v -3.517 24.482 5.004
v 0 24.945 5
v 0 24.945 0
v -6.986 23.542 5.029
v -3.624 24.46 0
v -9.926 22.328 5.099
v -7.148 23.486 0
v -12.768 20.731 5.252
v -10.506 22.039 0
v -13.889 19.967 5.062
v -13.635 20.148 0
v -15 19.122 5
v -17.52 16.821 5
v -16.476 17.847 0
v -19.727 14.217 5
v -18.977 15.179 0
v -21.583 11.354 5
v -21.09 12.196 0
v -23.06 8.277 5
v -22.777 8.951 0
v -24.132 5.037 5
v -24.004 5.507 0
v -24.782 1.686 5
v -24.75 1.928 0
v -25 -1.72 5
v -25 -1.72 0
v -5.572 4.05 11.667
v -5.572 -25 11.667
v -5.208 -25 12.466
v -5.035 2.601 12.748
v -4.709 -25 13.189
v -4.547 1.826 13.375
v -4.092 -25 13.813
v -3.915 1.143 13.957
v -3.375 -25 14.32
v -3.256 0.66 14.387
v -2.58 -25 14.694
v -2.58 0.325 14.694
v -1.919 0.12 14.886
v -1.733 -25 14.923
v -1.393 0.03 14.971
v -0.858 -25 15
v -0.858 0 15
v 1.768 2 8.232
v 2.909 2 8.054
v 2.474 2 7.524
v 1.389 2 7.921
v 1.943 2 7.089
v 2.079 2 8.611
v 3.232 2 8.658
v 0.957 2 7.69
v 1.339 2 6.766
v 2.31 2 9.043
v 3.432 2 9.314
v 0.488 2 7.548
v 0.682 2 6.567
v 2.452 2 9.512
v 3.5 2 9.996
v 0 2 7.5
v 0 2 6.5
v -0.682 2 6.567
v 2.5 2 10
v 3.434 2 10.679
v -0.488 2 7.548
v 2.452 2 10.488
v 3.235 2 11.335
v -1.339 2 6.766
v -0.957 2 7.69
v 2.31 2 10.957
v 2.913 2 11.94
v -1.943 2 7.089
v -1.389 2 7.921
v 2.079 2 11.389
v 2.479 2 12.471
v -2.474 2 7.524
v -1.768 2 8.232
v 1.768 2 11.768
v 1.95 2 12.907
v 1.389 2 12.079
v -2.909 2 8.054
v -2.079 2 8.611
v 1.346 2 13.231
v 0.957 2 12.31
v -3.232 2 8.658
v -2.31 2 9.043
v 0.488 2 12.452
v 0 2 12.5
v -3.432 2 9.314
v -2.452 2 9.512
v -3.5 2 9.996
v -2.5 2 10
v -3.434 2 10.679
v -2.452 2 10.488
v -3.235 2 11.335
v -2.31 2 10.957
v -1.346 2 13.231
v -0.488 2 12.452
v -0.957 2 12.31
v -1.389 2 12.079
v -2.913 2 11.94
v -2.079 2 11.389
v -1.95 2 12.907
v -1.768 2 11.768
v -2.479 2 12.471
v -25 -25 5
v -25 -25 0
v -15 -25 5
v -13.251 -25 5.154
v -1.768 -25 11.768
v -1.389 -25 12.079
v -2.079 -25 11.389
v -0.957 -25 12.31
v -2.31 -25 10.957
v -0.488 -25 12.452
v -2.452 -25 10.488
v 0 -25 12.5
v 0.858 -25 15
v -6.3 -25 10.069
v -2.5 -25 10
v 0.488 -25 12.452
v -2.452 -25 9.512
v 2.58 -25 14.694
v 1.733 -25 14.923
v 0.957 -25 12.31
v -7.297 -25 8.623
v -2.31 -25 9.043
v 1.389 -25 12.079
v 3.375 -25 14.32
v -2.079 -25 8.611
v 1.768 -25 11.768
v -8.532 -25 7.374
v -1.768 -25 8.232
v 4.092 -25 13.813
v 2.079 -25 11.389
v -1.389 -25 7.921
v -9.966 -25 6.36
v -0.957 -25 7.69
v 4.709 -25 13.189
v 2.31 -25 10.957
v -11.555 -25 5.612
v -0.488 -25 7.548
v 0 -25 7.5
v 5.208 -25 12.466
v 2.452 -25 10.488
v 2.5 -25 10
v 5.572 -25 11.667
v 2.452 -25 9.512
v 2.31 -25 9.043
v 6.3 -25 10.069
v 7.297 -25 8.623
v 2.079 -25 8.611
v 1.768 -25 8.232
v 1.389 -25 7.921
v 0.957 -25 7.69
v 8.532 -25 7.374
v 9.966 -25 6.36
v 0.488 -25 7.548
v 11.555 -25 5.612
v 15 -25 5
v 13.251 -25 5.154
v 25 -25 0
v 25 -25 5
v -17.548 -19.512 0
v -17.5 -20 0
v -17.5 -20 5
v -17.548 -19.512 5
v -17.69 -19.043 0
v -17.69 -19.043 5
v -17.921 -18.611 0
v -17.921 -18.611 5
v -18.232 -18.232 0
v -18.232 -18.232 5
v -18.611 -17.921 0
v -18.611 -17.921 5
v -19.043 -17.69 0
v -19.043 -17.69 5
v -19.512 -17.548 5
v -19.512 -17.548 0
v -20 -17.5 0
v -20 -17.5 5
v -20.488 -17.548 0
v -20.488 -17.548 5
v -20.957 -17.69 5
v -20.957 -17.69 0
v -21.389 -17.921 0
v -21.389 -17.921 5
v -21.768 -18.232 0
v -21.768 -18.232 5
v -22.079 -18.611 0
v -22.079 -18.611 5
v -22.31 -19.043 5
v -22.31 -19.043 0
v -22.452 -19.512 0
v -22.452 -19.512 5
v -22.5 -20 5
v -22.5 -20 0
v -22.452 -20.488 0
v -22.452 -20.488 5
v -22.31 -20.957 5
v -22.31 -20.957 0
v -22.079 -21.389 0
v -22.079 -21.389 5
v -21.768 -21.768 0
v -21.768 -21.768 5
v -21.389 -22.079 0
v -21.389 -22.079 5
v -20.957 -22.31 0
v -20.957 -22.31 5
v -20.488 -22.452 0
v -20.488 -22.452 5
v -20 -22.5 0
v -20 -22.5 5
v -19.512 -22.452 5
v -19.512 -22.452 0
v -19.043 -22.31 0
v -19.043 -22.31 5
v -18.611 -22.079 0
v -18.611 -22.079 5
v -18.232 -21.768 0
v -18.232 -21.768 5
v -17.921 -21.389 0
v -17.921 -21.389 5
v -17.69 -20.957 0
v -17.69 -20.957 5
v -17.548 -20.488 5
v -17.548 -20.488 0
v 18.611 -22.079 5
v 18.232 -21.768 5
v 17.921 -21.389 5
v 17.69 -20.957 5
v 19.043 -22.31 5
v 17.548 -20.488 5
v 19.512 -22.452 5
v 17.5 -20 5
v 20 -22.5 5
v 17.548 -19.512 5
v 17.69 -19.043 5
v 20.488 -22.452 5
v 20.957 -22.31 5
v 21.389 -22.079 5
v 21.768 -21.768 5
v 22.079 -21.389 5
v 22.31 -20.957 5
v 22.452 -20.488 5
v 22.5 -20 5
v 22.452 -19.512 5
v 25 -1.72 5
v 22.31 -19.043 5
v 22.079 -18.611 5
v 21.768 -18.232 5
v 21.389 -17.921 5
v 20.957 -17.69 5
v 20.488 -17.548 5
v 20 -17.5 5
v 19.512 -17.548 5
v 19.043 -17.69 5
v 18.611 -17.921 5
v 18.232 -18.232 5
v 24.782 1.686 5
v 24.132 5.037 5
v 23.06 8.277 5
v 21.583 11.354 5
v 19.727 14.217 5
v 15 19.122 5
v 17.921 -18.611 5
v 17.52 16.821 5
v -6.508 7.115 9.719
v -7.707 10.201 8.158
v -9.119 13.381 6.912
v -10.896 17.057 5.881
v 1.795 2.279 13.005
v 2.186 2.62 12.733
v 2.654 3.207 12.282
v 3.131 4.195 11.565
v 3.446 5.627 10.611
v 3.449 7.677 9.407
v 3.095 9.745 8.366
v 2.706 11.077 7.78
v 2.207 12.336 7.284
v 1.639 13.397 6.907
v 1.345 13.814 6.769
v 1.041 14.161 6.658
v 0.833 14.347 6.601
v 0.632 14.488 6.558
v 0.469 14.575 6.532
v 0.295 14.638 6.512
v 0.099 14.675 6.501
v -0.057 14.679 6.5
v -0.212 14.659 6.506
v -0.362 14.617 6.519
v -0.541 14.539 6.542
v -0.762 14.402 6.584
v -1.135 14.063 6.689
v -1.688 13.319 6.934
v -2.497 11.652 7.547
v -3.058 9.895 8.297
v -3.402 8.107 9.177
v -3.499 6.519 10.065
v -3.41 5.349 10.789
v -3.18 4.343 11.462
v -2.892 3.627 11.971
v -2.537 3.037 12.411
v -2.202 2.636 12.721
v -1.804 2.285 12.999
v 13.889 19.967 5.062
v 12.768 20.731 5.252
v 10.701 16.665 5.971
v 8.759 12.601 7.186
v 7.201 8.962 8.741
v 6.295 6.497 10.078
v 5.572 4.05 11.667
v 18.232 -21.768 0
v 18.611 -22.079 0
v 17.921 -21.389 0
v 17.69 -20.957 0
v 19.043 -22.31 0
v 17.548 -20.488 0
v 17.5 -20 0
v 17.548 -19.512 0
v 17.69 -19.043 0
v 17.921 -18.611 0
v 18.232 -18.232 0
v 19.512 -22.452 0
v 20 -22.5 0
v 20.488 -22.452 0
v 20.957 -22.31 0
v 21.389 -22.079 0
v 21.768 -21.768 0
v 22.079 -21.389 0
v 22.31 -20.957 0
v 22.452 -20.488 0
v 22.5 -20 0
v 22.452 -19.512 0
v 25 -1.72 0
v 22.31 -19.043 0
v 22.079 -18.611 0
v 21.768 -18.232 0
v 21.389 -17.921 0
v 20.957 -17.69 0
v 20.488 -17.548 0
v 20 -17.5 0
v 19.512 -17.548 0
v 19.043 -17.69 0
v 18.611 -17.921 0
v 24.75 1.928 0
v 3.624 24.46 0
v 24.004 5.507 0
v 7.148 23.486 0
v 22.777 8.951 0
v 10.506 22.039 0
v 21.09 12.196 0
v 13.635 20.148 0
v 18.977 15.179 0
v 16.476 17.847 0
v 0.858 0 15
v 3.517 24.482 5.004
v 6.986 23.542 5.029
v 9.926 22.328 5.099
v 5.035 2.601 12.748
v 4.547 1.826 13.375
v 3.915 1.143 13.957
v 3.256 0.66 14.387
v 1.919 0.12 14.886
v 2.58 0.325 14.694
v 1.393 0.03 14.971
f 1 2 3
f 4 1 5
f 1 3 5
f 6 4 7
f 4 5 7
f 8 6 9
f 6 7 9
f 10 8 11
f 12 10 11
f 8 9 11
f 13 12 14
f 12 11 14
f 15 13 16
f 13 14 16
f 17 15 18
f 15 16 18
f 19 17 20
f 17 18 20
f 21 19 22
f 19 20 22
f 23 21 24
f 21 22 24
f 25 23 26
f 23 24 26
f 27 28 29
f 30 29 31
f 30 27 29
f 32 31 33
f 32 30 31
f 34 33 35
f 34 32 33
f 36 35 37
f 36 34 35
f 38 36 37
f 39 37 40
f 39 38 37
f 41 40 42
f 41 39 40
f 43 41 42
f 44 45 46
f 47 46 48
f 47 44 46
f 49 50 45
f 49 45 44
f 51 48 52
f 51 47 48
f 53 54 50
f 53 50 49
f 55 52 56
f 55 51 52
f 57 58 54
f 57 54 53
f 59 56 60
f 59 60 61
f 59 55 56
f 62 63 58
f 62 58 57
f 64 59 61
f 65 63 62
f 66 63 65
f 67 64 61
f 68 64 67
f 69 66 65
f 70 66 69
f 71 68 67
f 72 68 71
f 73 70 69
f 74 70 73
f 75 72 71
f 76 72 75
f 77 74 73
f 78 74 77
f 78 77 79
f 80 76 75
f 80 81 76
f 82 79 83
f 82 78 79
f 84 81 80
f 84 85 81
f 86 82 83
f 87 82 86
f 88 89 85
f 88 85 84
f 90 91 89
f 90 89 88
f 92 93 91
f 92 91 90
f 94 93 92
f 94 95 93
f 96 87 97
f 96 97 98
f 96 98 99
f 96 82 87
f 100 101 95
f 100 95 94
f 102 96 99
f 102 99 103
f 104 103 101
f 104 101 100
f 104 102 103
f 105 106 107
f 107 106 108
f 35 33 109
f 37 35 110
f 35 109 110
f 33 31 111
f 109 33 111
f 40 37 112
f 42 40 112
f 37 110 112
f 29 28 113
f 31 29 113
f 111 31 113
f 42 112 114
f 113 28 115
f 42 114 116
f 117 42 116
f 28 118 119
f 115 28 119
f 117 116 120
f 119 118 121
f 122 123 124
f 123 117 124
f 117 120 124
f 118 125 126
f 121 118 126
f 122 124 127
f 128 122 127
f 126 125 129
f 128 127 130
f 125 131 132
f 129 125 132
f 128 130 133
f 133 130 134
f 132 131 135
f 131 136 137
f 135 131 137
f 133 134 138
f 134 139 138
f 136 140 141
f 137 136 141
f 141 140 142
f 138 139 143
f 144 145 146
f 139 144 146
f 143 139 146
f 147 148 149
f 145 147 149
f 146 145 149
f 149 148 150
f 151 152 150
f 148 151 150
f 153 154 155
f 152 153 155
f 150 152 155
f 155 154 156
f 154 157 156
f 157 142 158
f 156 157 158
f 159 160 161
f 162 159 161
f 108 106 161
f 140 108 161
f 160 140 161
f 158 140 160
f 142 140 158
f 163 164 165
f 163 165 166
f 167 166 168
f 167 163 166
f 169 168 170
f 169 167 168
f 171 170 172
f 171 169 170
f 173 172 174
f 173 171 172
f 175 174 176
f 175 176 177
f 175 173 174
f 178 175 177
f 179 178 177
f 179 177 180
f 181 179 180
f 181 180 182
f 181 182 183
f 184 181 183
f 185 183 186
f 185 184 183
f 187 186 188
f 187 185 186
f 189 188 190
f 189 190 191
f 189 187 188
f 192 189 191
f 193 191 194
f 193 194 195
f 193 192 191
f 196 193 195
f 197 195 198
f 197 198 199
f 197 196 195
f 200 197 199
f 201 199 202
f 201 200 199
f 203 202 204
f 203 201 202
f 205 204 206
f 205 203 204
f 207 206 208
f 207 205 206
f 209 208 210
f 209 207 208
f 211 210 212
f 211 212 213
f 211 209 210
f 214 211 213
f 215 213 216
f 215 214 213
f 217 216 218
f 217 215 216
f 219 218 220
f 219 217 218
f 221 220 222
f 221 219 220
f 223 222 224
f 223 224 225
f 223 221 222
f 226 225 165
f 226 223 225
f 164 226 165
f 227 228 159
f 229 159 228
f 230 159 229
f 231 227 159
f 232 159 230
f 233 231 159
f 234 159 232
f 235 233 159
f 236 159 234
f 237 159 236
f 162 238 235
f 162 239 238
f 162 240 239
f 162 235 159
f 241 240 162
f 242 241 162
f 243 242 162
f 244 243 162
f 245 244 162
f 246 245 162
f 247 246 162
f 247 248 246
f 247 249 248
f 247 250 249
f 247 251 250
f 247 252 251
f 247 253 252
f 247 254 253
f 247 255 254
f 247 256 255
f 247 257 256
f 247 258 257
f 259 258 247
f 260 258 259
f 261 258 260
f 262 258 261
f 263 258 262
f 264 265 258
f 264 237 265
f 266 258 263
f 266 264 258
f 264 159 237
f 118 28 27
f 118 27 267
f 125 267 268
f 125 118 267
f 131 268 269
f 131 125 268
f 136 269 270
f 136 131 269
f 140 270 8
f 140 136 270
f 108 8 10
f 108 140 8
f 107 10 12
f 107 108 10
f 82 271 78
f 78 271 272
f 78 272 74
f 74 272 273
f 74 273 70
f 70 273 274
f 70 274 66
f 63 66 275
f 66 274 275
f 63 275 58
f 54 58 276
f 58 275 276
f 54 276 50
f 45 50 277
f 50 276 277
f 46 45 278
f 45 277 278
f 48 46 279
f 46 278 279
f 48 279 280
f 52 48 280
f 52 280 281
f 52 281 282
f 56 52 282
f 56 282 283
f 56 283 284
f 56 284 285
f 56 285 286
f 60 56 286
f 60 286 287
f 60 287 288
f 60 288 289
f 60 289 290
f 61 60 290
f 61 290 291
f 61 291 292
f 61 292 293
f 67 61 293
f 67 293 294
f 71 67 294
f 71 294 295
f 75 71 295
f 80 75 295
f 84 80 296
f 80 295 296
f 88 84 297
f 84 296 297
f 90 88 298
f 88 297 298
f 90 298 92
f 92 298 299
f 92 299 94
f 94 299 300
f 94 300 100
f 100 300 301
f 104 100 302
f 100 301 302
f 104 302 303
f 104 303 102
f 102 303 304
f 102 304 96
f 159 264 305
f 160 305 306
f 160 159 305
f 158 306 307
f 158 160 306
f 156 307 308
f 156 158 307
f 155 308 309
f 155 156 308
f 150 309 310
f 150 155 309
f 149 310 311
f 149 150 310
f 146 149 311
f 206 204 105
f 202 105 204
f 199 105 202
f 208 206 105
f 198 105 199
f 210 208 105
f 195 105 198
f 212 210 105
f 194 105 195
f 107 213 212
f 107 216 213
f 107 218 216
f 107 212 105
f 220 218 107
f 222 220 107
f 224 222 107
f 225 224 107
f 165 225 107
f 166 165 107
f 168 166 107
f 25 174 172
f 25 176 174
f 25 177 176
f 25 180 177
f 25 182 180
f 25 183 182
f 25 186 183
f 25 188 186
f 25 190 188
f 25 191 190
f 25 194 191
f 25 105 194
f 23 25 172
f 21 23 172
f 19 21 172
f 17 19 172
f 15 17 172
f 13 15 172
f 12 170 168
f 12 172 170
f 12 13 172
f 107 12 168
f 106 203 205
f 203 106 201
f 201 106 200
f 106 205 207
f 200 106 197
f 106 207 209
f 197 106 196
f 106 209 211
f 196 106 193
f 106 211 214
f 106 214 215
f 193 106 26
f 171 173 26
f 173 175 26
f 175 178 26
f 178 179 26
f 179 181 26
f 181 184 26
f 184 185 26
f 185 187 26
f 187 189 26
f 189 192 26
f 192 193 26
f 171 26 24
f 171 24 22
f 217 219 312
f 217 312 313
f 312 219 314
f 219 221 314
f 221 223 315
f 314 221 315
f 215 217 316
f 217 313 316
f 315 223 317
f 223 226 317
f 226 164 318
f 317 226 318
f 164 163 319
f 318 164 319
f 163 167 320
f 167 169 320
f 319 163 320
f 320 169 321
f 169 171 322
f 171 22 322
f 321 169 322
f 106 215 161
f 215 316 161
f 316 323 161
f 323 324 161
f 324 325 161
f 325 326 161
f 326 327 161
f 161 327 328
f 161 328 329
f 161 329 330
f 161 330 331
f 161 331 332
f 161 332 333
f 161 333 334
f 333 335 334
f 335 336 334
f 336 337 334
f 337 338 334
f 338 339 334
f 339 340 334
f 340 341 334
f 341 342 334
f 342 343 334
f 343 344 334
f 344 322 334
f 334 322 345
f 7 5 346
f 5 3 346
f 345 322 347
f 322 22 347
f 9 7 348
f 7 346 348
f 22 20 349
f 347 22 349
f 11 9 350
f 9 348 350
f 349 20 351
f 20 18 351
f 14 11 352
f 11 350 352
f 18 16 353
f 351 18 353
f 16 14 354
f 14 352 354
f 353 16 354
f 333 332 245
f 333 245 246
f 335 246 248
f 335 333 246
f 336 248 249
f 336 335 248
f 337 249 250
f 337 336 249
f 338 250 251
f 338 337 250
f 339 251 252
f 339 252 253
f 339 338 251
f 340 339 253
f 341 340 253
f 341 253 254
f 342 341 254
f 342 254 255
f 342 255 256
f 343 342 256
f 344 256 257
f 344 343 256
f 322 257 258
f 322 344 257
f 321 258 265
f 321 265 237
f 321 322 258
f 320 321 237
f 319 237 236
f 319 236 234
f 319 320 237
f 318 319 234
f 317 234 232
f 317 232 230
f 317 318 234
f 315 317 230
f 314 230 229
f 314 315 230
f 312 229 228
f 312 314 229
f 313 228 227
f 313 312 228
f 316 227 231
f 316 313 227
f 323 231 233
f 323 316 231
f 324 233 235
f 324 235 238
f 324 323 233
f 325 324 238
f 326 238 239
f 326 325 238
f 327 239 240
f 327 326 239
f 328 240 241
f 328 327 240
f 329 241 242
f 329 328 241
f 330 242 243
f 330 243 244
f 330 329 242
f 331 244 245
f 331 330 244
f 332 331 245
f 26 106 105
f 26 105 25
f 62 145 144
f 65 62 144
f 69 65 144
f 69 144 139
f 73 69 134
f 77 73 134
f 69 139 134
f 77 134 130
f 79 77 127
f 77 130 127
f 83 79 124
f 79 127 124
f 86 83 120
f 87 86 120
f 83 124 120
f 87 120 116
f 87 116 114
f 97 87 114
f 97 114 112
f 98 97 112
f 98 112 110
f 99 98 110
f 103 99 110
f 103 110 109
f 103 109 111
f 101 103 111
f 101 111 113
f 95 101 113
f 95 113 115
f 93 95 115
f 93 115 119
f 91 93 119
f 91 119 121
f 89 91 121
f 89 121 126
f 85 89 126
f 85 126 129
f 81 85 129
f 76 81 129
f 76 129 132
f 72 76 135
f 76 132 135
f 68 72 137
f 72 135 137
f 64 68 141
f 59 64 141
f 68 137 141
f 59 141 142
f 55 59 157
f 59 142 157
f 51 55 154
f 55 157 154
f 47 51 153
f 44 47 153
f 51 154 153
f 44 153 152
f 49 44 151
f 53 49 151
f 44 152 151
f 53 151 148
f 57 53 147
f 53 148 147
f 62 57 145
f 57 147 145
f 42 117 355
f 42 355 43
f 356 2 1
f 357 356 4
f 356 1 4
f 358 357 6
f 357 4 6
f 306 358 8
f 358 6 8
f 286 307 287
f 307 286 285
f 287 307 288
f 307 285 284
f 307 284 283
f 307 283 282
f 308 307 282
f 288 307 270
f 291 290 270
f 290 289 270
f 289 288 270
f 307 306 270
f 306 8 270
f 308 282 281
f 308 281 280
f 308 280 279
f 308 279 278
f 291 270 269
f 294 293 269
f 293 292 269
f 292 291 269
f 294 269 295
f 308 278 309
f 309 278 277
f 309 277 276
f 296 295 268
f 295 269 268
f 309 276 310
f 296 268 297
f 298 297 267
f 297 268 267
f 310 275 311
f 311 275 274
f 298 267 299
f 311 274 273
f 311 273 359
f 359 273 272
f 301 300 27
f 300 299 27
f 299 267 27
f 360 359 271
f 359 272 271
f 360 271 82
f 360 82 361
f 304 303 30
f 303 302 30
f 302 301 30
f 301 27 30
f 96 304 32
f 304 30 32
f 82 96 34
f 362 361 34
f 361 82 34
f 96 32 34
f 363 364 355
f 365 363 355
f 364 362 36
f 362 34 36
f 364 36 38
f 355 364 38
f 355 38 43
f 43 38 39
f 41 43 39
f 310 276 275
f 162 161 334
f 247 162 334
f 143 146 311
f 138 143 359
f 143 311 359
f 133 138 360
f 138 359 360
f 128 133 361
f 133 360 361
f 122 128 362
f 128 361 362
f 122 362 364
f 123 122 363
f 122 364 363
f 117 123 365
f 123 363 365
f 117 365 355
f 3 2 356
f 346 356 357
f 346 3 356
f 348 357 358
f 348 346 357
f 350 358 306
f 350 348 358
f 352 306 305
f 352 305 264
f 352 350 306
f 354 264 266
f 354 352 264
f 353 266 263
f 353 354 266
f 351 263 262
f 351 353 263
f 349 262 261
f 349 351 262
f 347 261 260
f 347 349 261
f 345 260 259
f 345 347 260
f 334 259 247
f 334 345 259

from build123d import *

# Parameters (mm, degrees)
F0_W        = 50
F0_H        = 50
F0_R        = 2.5
F1_DEPTH    = 5
F2_R        = 2.5
F3_DEPTH    = 50
F4_R        = 5
F6_DEPTH    = 50
F7_R        = 3.5
F8_DEPTH    = 23
F9_T1_DEPTH = 138.5987158


# Not quite as in the source:
# - a fillet or chamfer that OpenCascade refuses, or shapes differently, is made with other operations: its cross-section is extruded or revolved along the edge and cut away or added


with BuildPart() as f1:
    # F0 (on Top) → F1 (new body)
    with BuildSketch(Plane.XY):
        Rectangle(F0_W, F0_H)
        with Locations((-20, -20)):
            Circle(F0_R, mode=Mode.SUBTRACT)
        with Locations((20, -20)):
            Circle(F0_R, mode=Mode.SUBTRACT)
    extrude(amount=F1_DEPTH)

    # F2 (on face) → F3 (join, through all)
    with BuildSketch(Plane.XZ.offset(25)):
        with BuildLine():
            Line((-5, 5), (5, 5))
            Line((5, 5), (15, 5))
            ThreePointArc((15, 5), (7.9289321881, 7.9289321881), (5, 15))
            Line((5, 15), (-5, 15))
            ThreePointArc((-5, 15), (-7.9289321881, 7.9289321881), (-15, 5))
            Line((-15, 5), (-5, 5))
        make_face()
        with Locations((0, 10)):
            Circle(F2_R, mode=Mode.SUBTRACT)
    extrude(amount=-F3_DEPTH)

    # F4
    f4_edges = [f1.edges().sort_by_distance(p)[0] for p in [
        (-5, 0, 15),
        (5, 0, 15),
    ]]
    fillet(f4_edges, radius=F4_R)

    # F5 (on face) → F6 (cut, through all)
    with BuildSketch(Plane(origin=(-25, 0, 0), x_dir=(0, -1, 0), z_dir=(-1, 0, 0))):
        with BuildLine():
            Line((-25, 15), (-25, 5))
            ThreePointArc((-25, 5), (-11.5370879822, 7.5927199554), (0, 15))
            Line((0, 15), (-25, 15))
        make_face()
    extrude(amount=-F6_DEPTH, mode=Mode.SUBTRACT)

    # F7 (on face) → F8 (cut)
    with BuildSketch(Plane(origin=(0, 25, 0), x_dir=(-1, 0, 0), z_dir=(0, 1, 0))):
        with Locations((0, 10)):
            Circle(F7_R)
    extrude(amount=-F8_DEPTH, mode=Mode.SUBTRACT)

    # F9: fillet of radius 26.71974316 on 2 edges, made by hand

    # F9_s2 → F9_t1 (cut)
    with BuildSketch(Plane.XY.offset(-66.7993579)):
        with BuildLine():
            ThreePointArc((-1.71974316, 25), (17.17396842, 17.17396842), (25, -1.71974316))
            Line((25, -1.71974316), (25, 25))
            Line((25, 25), (-1.71974316, 25))
        make_face()
        with BuildLine():
            ThreePointArc((1.71974316, 25), (-17.17396842, 17.17396842), (-25, -1.71974316))
            Line((-25, -1.71974316), (-25, 25))
            Line((-25, 25), (1.71974316, 25))
        make_face()
    extrude(amount=F9_T1_DEPTH, mode=Mode.SUBTRACT)


solid = f1.part
